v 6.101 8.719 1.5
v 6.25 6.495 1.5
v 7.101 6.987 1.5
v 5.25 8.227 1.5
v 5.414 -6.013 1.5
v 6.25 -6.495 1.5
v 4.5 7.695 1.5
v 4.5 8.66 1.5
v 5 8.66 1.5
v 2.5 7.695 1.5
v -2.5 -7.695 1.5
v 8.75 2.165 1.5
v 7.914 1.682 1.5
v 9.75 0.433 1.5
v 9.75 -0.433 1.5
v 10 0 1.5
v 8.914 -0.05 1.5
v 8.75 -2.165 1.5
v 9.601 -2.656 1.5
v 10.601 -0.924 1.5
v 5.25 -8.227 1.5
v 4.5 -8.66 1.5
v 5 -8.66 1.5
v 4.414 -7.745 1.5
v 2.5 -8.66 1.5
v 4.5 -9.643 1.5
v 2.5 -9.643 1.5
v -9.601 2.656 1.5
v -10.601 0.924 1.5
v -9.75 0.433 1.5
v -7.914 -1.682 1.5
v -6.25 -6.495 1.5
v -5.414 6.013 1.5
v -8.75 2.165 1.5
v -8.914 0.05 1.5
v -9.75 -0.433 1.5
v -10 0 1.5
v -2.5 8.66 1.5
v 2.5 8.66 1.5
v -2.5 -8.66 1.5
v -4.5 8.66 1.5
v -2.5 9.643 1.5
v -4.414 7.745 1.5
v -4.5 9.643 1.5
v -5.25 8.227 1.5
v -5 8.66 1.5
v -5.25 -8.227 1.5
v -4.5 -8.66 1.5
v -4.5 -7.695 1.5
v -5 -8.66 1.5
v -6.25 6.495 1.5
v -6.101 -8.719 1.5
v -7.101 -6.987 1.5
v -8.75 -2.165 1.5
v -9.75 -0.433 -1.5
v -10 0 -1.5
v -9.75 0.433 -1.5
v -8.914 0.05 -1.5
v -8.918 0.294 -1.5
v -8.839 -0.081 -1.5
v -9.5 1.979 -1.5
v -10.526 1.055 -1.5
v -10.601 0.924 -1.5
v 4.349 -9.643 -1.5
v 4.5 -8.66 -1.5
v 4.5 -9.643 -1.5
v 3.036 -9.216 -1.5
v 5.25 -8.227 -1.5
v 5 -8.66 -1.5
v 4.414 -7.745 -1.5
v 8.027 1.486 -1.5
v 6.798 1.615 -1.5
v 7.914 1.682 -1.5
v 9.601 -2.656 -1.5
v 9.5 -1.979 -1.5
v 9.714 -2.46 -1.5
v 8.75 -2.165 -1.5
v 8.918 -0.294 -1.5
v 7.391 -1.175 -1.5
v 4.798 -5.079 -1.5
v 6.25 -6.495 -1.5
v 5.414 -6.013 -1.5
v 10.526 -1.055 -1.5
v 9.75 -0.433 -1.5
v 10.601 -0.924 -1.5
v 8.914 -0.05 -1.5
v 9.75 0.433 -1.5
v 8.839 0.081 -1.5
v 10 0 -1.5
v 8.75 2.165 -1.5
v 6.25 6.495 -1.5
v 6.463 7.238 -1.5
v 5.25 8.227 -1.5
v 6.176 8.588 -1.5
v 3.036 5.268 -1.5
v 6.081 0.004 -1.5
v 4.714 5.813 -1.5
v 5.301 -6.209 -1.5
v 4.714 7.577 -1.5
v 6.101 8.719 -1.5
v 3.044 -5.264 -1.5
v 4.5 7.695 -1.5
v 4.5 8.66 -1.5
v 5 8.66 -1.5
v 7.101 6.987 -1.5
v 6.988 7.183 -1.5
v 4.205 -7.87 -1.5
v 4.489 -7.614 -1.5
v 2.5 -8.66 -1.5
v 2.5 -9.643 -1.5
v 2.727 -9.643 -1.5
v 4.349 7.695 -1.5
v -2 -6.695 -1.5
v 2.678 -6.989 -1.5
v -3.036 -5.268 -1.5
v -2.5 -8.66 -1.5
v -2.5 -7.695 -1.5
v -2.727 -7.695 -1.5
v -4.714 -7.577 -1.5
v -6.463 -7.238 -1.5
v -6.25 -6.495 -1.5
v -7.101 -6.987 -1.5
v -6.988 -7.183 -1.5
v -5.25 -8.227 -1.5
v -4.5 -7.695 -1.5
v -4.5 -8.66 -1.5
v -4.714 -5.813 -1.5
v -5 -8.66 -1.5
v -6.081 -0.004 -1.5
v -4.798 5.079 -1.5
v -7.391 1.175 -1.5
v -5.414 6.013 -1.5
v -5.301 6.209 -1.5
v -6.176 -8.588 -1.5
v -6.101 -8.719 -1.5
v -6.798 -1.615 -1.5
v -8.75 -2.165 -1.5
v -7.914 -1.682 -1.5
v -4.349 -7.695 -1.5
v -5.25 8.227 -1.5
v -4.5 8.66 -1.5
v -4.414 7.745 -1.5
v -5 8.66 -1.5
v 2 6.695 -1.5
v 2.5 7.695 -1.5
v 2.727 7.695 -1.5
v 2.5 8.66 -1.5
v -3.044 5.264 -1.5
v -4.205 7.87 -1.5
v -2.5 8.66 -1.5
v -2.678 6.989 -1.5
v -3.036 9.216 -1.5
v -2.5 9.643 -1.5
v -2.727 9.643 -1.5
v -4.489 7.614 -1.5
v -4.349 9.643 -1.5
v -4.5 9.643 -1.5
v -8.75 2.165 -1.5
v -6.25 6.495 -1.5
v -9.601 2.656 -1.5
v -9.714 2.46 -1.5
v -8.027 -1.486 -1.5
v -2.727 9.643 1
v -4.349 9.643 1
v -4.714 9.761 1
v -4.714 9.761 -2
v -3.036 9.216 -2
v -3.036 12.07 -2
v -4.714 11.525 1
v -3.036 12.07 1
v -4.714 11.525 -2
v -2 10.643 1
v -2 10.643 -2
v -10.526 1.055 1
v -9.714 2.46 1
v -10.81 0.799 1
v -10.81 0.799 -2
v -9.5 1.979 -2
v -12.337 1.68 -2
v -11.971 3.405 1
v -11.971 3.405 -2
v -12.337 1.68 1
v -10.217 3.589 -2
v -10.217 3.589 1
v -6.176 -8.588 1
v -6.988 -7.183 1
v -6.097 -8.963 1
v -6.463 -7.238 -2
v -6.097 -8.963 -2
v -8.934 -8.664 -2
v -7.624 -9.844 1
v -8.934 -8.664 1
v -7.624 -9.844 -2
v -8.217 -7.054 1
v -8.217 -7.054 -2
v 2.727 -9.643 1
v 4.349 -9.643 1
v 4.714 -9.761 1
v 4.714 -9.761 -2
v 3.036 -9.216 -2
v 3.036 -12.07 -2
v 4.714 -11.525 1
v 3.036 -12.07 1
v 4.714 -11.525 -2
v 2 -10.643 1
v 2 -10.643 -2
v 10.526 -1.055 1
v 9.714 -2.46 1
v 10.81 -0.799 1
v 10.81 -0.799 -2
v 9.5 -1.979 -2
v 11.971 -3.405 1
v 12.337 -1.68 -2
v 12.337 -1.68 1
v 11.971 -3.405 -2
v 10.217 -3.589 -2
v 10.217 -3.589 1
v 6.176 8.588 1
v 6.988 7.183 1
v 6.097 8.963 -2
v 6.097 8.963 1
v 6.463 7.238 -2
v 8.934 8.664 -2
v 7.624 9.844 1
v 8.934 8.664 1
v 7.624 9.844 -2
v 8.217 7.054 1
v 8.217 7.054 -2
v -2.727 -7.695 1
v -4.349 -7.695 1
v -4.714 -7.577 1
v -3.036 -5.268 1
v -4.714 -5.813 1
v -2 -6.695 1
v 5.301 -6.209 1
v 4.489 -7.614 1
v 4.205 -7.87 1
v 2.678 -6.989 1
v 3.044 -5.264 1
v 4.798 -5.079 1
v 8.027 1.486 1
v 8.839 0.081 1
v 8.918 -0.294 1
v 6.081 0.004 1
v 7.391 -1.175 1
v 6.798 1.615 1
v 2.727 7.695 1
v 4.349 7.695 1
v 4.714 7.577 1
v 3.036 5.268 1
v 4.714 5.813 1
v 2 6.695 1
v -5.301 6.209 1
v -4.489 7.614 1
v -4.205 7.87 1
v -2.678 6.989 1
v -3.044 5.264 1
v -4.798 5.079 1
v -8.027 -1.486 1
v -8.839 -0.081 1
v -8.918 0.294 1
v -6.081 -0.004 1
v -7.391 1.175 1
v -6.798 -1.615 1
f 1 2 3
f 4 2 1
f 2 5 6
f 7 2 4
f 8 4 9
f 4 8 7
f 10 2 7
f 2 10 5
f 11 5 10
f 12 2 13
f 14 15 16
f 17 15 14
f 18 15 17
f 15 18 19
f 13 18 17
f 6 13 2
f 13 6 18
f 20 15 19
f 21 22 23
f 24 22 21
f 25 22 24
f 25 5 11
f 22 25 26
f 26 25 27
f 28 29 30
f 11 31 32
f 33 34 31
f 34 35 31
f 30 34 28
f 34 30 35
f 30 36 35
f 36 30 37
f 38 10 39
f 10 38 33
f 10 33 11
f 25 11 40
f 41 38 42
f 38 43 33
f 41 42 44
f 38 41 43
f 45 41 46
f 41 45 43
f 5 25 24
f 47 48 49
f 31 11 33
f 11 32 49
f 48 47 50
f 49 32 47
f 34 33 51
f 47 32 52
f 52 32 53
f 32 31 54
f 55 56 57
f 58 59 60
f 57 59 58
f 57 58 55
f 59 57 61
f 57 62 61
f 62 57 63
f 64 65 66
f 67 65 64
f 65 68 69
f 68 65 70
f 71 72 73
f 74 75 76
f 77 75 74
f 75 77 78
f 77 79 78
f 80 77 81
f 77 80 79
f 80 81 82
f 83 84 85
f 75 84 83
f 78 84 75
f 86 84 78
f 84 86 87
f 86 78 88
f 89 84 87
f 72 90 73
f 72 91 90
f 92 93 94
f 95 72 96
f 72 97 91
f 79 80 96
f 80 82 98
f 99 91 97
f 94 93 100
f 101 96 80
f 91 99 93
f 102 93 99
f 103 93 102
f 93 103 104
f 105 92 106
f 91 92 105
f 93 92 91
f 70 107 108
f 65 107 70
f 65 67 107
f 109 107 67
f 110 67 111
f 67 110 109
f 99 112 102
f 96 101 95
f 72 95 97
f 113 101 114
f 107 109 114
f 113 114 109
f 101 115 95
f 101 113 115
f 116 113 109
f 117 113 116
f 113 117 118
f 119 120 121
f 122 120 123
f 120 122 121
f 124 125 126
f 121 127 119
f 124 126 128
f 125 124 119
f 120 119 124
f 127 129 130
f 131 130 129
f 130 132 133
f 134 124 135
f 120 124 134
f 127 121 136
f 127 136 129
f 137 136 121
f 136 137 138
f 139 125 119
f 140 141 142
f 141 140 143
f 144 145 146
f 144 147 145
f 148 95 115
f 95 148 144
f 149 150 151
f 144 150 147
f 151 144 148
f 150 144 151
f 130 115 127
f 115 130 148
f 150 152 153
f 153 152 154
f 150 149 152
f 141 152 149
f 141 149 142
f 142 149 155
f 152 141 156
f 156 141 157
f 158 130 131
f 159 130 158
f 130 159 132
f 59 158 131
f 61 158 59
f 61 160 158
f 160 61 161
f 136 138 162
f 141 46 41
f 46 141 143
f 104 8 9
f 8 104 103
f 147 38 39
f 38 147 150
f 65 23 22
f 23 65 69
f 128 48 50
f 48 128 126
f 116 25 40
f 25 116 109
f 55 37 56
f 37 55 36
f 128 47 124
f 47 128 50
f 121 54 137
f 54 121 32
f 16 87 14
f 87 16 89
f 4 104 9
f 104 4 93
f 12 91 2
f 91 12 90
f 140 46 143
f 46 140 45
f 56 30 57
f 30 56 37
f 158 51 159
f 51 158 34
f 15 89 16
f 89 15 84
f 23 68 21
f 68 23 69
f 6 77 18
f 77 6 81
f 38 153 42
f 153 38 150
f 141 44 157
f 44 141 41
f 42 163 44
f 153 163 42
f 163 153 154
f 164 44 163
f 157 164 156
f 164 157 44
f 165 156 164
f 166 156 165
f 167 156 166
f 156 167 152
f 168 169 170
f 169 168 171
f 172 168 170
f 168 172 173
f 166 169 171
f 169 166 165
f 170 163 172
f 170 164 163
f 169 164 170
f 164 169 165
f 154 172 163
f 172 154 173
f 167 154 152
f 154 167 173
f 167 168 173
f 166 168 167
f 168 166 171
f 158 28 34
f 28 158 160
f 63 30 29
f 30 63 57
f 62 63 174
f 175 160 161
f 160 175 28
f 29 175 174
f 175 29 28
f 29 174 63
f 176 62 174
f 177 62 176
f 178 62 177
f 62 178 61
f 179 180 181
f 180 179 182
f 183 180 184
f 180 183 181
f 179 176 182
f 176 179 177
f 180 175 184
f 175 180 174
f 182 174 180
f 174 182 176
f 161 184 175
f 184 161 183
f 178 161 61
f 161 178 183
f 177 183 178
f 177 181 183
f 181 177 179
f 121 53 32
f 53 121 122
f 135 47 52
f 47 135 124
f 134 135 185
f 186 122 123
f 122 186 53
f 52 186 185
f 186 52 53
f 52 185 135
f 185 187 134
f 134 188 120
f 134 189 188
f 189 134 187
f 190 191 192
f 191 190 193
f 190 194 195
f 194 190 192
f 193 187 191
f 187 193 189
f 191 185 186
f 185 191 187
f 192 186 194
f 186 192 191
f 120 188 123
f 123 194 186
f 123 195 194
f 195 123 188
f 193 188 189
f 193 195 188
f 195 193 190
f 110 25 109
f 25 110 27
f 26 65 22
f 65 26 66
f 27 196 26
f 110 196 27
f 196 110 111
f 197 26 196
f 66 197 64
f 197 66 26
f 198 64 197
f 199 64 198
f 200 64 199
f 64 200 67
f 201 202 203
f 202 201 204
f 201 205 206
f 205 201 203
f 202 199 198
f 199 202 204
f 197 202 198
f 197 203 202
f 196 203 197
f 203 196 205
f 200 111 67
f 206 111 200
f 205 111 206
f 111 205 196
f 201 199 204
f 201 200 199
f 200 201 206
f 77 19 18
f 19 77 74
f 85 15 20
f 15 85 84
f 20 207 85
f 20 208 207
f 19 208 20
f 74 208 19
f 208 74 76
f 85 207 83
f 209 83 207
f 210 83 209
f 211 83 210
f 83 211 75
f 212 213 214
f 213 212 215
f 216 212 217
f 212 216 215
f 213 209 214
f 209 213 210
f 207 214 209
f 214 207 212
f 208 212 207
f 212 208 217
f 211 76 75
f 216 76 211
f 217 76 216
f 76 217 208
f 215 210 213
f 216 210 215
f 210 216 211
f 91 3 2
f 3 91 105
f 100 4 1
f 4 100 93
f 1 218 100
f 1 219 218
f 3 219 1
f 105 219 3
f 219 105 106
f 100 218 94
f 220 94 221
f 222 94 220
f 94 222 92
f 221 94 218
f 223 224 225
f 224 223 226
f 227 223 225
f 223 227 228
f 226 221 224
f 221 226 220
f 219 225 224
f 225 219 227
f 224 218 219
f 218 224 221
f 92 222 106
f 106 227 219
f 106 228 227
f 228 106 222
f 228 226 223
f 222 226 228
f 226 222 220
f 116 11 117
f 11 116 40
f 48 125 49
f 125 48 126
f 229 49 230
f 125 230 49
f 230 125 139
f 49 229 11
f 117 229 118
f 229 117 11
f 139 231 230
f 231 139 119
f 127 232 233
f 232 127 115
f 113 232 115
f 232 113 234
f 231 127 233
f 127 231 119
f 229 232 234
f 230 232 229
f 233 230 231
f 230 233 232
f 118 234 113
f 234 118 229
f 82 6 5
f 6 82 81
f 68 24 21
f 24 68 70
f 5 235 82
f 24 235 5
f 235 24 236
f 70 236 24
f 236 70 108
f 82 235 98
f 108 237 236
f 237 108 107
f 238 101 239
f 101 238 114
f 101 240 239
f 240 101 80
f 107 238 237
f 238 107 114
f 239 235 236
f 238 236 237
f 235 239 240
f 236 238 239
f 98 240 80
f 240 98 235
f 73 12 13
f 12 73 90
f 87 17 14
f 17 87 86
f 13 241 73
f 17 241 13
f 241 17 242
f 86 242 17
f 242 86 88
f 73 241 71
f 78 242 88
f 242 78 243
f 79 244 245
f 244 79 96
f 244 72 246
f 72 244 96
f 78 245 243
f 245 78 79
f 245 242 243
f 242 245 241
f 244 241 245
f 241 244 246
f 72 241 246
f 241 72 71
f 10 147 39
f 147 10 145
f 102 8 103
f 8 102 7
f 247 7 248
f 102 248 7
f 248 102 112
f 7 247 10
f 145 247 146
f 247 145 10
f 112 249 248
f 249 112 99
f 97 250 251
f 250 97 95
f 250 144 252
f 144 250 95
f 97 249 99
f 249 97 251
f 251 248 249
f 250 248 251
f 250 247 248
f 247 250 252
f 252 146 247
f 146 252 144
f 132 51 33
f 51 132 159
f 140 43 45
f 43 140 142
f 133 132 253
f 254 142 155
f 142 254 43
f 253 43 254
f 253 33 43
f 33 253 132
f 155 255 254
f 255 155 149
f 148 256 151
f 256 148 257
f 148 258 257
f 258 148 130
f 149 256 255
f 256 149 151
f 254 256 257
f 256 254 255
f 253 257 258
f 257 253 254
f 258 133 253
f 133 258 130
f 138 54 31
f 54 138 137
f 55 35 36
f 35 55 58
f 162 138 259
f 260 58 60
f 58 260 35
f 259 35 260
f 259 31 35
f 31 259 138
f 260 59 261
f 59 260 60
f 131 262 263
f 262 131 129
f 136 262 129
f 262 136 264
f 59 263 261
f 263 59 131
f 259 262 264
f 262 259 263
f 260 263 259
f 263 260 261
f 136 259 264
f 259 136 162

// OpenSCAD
difference() {
union() {
union() {
union() {
cube([10,17.3205080757,3],center=true); 
rotate([0,0,120]) cube([10,17.3205080757,3],center=true); 
}
rotate([0,0,240]) cube([10,17.3205080757,3],center=true); 
}
union() {
union() {
union() {
union() {
union() {
union() {
rotate([0,0,0]) translate([-3.5,8.64293352977,0]) union() {
cube([2,2,3],center=true); 
translate([0,2,-2]) cylinder(3,1.5,1.5,center=false); 
}
}
rotate([0,0,60]) translate([-3.5,8.64293352977,0]) union() {
cube([2,2,3],center=true); 
translate([0,2,-2]) cylinder(3,1.5,1.5,center=false); 
}
}
rotate([0,0,120]) translate([-3.5,8.64293352977,0]) union() {
cube([2,2,3],center=true); 
translate([0,2,-2]) cylinder(3,1.5,1.5,center=false); 
}
}
rotate([0,0,180]) translate([-3.5,8.64293352977,0]) union() {
cube([2,2,3],center=true); 
translate([0,2,-2]) cylinder(3,1.5,1.5,center=false); 
}
}
rotate([0,0,240]) translate([-3.5,8.64293352977,0]) union() {
cube([2,2,3],center=true); 
translate([0,2,-2]) cylinder(3,1.5,1.5,center=false); 
}
}
rotate([0,0,300]) translate([-3.5,8.64293352977,0]) union() {
cube([2,2,3],center=true); 
translate([0,2,-2]) cylinder(3,1.5,1.5,center=false); 
}
}
}
union() {
union() {
union() {
union() {
union() {
union() {
rotate([0,0,0]) translate([0,-17.3378285838,0]) translate([-3.5,8.64293352977,0]) union() {
cube([2,2,3],center=true); 
translate([0,2,-2]) cylinder(3,1.5,1.5,center=false); 
}
}
rotate([0,0,60]) translate([0,-17.3378285838,0]) translate([-3.5,8.64293352977,0]) union() {
cube([2,2,3],center=true); 
translate([0,2,-2]) cylinder(3,1.5,1.5,center=false); 
}
}
rotate([0,0,120]) translate([0,-17.3378285838,0]) translate([-3.5,8.64293352977,0]) union() {
cube([2,2,3],center=true); 
translate([0,2,-2]) cylinder(3,1.5,1.5,center=false); 
}
}
rotate([0,0,180]) translate([0,-17.3378285838,0]) translate([-3.5,8.64293352977,0]) union() {
cube([2,2,3],center=true); 
translate([0,2,-2]) cylinder(3,1.5,1.5,center=false); 
}
}
rotate([0,0,240]) translate([0,-17.3378285838,0]) translate([-3.5,8.64293352977,0]) union() {
cube([2,2,3],center=true); 
translate([0,2,-2]) cylinder(3,1.5,1.5,center=false); 
}
}
rotate([0,0,300]) translate([0,-17.3378285838,0]) translate([-3.5,8.64293352977,0]) union() {
cube([2,2,3],center=true); 
translate([0,2,-2]) cylinder(3,1.5,1.5,center=false); 
}
}
}
